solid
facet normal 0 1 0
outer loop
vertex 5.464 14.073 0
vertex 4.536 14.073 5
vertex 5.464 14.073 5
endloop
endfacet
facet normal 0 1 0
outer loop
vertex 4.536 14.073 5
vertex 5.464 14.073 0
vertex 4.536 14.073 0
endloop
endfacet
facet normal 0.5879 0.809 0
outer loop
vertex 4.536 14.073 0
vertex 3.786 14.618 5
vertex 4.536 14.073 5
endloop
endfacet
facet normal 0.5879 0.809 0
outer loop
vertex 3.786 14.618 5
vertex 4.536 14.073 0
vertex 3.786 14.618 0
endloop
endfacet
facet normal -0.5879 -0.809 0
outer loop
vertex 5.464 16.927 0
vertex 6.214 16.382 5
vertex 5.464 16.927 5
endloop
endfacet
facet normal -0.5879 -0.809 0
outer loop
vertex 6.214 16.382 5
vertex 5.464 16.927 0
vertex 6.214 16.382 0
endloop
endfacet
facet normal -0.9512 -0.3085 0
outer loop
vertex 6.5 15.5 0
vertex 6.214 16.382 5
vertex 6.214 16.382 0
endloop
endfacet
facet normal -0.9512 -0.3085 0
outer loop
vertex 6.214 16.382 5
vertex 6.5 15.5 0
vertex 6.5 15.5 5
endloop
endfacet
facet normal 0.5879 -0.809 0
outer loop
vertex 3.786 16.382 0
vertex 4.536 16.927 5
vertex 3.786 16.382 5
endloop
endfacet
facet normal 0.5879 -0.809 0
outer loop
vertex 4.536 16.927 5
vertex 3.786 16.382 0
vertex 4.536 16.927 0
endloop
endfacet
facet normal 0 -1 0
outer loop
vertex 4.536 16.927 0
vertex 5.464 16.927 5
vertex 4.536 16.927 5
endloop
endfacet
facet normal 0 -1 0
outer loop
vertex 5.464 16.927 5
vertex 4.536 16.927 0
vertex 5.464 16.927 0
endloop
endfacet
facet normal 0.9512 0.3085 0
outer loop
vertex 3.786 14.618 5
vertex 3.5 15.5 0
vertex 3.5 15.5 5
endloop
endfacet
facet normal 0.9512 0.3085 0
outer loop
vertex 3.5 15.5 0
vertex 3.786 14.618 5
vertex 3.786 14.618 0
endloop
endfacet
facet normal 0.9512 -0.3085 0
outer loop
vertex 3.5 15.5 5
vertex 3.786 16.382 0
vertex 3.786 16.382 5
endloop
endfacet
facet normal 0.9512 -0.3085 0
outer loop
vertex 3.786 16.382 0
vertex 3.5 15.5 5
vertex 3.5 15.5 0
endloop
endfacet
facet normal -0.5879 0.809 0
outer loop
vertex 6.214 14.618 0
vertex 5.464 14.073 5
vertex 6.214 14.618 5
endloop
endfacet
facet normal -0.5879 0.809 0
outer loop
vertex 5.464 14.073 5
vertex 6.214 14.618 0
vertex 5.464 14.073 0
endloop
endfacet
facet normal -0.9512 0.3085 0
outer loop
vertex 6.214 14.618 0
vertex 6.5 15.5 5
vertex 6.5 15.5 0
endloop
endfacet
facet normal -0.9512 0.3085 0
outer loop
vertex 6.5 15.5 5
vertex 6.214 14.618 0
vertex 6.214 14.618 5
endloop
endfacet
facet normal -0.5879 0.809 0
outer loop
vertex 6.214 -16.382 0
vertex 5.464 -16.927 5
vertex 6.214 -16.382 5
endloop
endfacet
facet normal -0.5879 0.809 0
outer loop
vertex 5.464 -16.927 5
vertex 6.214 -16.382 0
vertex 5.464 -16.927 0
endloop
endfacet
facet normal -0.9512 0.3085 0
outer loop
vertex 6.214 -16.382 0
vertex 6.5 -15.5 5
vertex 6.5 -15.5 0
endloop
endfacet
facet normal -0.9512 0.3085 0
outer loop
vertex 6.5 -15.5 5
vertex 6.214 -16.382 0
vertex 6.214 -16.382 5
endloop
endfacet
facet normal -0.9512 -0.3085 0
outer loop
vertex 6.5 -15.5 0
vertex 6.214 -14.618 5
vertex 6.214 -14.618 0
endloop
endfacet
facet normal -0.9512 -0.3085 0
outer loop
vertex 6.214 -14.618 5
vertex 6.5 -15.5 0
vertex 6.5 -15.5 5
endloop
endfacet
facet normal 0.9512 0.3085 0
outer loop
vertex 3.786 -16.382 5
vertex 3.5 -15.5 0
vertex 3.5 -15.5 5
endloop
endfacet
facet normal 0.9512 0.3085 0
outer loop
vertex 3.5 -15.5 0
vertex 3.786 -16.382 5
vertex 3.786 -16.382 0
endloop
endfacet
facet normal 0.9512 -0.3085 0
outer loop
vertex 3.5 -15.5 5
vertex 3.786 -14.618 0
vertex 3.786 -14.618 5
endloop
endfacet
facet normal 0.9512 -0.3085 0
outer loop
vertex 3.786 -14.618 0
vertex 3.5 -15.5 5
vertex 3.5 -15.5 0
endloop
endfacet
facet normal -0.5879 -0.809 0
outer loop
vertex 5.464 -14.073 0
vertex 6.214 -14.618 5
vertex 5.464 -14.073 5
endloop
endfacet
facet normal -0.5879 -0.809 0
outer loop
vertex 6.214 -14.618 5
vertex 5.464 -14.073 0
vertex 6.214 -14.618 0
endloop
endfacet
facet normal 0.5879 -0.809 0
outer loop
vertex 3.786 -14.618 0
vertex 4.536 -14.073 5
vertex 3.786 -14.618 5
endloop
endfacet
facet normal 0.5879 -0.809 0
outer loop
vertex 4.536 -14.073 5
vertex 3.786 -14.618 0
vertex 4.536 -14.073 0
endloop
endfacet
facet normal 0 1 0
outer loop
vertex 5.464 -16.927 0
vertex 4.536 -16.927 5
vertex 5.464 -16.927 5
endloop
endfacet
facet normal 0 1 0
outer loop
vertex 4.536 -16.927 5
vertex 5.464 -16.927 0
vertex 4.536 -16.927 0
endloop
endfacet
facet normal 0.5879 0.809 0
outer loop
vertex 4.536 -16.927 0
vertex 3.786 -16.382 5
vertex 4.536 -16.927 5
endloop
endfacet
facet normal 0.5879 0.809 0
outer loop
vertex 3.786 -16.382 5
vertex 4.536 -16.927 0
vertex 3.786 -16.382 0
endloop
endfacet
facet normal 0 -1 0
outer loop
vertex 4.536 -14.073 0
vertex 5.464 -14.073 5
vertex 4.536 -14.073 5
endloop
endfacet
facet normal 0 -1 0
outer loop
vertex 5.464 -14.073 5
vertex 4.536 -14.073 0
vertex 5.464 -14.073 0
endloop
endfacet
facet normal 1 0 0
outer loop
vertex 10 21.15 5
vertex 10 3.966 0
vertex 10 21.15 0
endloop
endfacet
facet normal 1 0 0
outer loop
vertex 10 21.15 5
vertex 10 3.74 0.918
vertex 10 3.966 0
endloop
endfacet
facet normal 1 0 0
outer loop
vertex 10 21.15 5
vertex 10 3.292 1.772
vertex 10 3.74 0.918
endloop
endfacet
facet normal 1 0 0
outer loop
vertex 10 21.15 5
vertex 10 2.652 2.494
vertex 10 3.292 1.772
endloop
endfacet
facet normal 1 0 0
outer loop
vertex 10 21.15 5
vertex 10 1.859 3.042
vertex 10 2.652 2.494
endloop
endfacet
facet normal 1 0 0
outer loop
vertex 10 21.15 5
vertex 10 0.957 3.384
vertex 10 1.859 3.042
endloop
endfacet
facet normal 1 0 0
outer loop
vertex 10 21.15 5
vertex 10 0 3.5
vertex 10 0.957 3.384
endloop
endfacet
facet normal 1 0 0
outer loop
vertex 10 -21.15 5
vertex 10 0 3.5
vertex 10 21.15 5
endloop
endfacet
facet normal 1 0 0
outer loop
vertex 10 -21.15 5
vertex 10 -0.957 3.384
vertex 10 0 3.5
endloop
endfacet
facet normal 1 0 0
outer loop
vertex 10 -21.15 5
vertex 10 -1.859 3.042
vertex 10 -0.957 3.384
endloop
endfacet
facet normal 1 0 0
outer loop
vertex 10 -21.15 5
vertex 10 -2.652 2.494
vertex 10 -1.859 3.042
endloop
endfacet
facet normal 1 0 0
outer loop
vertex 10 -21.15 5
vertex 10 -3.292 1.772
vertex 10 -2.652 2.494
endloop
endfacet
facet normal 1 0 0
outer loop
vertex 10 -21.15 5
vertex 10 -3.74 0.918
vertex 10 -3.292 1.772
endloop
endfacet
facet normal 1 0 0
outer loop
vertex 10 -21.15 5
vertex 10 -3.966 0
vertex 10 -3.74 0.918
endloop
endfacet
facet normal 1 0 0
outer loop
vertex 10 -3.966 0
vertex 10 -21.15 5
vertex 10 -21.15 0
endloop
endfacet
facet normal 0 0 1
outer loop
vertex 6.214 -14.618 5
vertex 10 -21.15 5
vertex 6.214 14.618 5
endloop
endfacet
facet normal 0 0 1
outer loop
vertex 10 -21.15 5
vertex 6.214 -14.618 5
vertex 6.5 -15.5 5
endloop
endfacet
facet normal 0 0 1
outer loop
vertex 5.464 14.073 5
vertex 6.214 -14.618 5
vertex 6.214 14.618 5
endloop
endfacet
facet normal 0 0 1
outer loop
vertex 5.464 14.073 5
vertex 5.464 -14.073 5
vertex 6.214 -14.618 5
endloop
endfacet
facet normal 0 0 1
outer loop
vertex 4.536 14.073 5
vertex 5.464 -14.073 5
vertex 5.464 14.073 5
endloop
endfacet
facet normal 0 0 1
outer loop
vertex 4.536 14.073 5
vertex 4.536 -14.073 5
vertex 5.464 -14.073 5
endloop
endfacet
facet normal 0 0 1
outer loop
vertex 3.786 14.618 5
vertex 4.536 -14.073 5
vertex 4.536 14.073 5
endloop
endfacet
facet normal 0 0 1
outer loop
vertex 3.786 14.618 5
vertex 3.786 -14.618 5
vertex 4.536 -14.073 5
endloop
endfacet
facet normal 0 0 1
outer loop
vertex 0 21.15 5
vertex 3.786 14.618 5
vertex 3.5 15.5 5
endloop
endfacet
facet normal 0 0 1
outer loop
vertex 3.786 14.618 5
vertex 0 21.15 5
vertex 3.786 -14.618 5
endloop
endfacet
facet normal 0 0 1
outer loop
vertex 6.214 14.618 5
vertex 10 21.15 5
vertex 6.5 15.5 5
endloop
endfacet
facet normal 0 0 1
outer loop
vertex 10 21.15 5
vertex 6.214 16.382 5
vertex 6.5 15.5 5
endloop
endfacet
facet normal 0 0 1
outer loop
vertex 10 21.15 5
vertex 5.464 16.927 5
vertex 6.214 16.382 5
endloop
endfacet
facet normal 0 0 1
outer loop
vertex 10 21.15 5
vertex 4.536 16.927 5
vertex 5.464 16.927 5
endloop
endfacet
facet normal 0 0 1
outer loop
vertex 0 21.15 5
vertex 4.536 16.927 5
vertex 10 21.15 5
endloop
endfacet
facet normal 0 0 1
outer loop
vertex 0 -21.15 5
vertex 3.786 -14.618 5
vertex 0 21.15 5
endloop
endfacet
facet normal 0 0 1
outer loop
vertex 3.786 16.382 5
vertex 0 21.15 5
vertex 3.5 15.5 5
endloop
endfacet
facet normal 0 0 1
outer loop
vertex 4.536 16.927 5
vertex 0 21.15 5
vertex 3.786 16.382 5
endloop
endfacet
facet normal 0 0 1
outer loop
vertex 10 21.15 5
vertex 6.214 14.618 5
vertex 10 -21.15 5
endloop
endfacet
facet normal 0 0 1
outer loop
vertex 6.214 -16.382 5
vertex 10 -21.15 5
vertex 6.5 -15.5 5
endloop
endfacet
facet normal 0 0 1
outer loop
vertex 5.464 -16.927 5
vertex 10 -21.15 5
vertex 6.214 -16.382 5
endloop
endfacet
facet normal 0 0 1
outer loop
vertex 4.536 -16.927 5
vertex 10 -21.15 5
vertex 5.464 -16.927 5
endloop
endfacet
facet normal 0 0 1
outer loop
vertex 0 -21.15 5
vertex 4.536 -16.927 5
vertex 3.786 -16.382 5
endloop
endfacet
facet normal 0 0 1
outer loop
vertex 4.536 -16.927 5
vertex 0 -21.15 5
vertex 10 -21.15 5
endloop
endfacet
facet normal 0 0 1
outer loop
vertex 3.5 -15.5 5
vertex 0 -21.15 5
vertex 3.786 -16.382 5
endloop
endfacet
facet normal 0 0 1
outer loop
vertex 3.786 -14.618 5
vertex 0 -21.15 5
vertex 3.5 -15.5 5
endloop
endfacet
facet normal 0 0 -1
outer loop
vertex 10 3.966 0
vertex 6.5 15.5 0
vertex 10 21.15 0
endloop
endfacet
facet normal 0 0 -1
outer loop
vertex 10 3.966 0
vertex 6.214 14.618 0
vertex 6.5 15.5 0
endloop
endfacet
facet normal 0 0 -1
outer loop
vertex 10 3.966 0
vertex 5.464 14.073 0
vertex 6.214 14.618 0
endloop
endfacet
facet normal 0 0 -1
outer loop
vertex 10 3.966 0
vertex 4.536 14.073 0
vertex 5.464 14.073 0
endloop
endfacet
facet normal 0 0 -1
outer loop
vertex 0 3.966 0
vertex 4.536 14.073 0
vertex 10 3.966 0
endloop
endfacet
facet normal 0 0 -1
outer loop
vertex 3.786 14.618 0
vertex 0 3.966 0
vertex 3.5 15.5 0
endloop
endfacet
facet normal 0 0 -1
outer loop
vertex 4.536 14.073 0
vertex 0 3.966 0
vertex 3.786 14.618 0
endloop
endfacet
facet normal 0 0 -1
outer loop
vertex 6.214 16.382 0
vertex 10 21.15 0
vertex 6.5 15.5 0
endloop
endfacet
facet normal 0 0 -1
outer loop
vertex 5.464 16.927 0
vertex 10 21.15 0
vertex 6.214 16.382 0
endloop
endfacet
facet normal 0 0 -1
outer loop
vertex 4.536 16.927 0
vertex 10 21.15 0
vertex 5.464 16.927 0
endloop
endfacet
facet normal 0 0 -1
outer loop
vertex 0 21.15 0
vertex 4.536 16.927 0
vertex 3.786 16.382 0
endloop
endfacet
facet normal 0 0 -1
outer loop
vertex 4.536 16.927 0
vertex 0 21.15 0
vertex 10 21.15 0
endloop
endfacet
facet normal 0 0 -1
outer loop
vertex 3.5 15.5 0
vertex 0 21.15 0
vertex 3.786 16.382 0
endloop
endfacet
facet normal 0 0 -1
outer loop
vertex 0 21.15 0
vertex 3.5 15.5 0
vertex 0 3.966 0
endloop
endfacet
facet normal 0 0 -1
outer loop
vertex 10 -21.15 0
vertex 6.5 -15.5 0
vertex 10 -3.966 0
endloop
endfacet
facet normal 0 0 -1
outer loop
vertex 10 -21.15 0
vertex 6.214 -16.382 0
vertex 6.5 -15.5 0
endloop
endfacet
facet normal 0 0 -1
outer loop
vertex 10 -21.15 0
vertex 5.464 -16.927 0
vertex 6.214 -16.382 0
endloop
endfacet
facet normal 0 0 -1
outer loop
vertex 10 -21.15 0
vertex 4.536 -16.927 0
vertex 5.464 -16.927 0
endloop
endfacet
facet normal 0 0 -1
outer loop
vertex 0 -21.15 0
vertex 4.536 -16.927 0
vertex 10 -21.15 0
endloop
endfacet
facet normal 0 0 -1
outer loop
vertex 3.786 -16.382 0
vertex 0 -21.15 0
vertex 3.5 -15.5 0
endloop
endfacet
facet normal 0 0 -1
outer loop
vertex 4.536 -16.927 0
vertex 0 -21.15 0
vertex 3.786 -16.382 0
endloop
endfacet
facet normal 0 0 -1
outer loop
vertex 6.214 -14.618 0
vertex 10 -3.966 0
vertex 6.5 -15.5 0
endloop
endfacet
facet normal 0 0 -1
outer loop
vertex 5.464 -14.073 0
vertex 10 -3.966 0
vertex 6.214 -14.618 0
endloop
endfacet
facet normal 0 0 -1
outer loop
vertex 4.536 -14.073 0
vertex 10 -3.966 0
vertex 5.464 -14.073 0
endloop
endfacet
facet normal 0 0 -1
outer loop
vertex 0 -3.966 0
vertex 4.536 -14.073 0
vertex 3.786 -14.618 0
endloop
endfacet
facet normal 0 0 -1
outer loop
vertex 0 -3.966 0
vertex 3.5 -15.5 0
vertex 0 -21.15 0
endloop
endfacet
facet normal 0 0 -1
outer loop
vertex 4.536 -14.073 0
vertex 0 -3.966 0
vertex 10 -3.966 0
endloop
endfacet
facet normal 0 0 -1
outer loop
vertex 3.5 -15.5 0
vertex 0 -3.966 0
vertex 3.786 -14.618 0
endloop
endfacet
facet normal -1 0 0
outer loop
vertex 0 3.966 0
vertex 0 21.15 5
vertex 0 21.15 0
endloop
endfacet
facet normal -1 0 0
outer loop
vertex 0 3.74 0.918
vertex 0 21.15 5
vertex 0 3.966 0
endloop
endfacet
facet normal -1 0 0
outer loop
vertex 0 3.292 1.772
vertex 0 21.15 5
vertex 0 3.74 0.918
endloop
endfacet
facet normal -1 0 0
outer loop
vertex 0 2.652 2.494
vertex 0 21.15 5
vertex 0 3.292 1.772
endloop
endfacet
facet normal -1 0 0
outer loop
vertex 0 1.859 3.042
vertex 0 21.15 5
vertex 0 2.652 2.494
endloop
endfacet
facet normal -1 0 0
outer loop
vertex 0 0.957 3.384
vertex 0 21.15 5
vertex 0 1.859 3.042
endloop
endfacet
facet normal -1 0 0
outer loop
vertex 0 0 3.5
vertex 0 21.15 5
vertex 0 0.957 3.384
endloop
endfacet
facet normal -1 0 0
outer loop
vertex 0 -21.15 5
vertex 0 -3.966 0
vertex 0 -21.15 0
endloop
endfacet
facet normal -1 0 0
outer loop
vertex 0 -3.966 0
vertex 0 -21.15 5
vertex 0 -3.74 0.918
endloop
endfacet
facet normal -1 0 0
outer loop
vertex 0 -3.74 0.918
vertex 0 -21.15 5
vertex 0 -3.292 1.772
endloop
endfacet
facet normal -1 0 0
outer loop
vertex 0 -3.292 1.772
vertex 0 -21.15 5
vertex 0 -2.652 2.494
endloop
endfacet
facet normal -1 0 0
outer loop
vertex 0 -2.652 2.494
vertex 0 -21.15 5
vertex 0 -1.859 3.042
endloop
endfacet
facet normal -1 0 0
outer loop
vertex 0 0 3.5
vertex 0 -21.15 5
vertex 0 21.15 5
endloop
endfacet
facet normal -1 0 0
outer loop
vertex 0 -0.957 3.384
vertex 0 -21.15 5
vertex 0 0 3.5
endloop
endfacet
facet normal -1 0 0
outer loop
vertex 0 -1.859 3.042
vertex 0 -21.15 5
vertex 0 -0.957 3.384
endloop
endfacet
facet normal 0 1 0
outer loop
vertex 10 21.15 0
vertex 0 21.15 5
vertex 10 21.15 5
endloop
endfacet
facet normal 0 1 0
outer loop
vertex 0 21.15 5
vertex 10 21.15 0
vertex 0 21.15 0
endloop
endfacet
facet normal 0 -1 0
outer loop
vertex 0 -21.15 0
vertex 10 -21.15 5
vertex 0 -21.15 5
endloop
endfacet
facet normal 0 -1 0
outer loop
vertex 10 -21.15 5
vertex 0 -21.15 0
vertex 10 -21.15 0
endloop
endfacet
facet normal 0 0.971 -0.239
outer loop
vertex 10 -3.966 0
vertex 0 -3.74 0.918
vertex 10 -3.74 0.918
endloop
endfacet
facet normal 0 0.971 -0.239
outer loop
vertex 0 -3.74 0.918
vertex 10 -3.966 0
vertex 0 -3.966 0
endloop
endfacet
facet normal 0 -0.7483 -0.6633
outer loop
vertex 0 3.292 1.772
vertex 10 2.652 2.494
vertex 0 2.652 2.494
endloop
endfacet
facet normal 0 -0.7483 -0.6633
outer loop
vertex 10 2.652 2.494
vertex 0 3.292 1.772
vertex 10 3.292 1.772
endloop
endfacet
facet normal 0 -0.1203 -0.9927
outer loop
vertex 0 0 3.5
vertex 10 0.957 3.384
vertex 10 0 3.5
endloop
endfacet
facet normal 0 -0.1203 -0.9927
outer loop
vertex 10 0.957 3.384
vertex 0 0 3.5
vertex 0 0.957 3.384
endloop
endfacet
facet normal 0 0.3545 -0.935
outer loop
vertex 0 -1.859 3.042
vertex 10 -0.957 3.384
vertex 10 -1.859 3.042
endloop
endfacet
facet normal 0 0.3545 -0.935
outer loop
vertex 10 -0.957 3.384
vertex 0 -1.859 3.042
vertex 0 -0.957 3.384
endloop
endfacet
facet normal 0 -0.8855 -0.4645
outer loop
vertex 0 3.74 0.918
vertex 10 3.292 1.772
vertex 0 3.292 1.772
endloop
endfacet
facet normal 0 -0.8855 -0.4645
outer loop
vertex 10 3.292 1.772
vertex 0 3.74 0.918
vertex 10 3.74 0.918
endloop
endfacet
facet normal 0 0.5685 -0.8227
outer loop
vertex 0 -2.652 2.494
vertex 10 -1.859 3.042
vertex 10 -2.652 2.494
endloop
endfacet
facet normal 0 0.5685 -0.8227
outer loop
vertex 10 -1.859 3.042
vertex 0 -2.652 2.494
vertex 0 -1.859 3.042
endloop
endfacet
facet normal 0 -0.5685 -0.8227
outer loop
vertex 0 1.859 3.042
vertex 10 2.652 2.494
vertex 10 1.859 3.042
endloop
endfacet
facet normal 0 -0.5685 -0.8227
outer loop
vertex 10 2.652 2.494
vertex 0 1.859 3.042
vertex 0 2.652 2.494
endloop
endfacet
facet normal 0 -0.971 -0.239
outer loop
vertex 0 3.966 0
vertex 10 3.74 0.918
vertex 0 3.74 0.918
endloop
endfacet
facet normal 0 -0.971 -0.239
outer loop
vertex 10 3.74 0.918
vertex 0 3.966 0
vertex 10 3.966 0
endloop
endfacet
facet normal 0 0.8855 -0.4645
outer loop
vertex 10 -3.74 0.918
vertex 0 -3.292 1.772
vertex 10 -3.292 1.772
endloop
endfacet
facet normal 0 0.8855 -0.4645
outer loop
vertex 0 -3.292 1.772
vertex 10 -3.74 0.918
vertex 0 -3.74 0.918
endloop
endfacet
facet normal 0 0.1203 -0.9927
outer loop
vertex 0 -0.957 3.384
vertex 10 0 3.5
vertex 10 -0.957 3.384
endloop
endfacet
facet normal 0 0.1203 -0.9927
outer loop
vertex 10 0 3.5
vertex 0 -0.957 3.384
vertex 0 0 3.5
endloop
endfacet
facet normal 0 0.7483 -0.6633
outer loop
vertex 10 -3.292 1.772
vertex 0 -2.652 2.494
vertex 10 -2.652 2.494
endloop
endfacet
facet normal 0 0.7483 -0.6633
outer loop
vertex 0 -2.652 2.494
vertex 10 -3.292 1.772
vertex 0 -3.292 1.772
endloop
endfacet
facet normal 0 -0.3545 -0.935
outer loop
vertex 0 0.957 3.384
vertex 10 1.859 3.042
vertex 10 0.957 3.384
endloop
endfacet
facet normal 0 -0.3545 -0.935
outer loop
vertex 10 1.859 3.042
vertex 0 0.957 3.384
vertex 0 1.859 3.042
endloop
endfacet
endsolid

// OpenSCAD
$fs=1;

difference() {
	translate(v = [5.0000000000, 0.0000000000, 2.5000000000]) {
		translate(v = [-5.0000000000, -21.1500000000, -2.5000000000]) {
			cube(size = [10, 42.3000000000, 5]);
		}
	}
	translate(v = [0, 0, -0.5000000000]) {
		rotate(a = [0, 90, 0]) {
			cylinder(d = 8, h = 10);
		}
	}
	union() {
		translate(v = [5, 15.5000000000, 0]) {
			translate(v = [0, 0, -6.0000000000]) {
				cylinder(d = 3, h = 12);
			}
		}
		mirror(v = [0, 1, 0]) {
			translate(v = [5, 15.5000000000, 0]) {
				translate(v = [0, 0, -6.0000000000]) {
					cylinder(d = 3, h = 12);
				}
			}
		}
	}
}
/***********************************************
*********      SolidPython code:      **********
************************************************
 
from solid import *
from solid import extensions

class Object:
    pass

nema17 = Object()

rodD=8
screwD=3
nema17.side = 42.3
nema17.holeDistance = 31
thk=1
supportSide=10


rodSupportBase = ( cube([supportSide,nema17.side,rodD/2+1]).align('left','bottom')
                   - cylinder(d=rodD,h=supportSide).rot(y=90).move(z=-.5)
                   - cylinder(d=screwD,h=12).center().move(x=5,y=nema17.holeDistance/2.).mirrorCopy('y'))

scene = rodSupportBase





scad_render_to_file(scene, 'rodSupportForNema17.scad', '$fs=1;')
 
 
************************************************/
